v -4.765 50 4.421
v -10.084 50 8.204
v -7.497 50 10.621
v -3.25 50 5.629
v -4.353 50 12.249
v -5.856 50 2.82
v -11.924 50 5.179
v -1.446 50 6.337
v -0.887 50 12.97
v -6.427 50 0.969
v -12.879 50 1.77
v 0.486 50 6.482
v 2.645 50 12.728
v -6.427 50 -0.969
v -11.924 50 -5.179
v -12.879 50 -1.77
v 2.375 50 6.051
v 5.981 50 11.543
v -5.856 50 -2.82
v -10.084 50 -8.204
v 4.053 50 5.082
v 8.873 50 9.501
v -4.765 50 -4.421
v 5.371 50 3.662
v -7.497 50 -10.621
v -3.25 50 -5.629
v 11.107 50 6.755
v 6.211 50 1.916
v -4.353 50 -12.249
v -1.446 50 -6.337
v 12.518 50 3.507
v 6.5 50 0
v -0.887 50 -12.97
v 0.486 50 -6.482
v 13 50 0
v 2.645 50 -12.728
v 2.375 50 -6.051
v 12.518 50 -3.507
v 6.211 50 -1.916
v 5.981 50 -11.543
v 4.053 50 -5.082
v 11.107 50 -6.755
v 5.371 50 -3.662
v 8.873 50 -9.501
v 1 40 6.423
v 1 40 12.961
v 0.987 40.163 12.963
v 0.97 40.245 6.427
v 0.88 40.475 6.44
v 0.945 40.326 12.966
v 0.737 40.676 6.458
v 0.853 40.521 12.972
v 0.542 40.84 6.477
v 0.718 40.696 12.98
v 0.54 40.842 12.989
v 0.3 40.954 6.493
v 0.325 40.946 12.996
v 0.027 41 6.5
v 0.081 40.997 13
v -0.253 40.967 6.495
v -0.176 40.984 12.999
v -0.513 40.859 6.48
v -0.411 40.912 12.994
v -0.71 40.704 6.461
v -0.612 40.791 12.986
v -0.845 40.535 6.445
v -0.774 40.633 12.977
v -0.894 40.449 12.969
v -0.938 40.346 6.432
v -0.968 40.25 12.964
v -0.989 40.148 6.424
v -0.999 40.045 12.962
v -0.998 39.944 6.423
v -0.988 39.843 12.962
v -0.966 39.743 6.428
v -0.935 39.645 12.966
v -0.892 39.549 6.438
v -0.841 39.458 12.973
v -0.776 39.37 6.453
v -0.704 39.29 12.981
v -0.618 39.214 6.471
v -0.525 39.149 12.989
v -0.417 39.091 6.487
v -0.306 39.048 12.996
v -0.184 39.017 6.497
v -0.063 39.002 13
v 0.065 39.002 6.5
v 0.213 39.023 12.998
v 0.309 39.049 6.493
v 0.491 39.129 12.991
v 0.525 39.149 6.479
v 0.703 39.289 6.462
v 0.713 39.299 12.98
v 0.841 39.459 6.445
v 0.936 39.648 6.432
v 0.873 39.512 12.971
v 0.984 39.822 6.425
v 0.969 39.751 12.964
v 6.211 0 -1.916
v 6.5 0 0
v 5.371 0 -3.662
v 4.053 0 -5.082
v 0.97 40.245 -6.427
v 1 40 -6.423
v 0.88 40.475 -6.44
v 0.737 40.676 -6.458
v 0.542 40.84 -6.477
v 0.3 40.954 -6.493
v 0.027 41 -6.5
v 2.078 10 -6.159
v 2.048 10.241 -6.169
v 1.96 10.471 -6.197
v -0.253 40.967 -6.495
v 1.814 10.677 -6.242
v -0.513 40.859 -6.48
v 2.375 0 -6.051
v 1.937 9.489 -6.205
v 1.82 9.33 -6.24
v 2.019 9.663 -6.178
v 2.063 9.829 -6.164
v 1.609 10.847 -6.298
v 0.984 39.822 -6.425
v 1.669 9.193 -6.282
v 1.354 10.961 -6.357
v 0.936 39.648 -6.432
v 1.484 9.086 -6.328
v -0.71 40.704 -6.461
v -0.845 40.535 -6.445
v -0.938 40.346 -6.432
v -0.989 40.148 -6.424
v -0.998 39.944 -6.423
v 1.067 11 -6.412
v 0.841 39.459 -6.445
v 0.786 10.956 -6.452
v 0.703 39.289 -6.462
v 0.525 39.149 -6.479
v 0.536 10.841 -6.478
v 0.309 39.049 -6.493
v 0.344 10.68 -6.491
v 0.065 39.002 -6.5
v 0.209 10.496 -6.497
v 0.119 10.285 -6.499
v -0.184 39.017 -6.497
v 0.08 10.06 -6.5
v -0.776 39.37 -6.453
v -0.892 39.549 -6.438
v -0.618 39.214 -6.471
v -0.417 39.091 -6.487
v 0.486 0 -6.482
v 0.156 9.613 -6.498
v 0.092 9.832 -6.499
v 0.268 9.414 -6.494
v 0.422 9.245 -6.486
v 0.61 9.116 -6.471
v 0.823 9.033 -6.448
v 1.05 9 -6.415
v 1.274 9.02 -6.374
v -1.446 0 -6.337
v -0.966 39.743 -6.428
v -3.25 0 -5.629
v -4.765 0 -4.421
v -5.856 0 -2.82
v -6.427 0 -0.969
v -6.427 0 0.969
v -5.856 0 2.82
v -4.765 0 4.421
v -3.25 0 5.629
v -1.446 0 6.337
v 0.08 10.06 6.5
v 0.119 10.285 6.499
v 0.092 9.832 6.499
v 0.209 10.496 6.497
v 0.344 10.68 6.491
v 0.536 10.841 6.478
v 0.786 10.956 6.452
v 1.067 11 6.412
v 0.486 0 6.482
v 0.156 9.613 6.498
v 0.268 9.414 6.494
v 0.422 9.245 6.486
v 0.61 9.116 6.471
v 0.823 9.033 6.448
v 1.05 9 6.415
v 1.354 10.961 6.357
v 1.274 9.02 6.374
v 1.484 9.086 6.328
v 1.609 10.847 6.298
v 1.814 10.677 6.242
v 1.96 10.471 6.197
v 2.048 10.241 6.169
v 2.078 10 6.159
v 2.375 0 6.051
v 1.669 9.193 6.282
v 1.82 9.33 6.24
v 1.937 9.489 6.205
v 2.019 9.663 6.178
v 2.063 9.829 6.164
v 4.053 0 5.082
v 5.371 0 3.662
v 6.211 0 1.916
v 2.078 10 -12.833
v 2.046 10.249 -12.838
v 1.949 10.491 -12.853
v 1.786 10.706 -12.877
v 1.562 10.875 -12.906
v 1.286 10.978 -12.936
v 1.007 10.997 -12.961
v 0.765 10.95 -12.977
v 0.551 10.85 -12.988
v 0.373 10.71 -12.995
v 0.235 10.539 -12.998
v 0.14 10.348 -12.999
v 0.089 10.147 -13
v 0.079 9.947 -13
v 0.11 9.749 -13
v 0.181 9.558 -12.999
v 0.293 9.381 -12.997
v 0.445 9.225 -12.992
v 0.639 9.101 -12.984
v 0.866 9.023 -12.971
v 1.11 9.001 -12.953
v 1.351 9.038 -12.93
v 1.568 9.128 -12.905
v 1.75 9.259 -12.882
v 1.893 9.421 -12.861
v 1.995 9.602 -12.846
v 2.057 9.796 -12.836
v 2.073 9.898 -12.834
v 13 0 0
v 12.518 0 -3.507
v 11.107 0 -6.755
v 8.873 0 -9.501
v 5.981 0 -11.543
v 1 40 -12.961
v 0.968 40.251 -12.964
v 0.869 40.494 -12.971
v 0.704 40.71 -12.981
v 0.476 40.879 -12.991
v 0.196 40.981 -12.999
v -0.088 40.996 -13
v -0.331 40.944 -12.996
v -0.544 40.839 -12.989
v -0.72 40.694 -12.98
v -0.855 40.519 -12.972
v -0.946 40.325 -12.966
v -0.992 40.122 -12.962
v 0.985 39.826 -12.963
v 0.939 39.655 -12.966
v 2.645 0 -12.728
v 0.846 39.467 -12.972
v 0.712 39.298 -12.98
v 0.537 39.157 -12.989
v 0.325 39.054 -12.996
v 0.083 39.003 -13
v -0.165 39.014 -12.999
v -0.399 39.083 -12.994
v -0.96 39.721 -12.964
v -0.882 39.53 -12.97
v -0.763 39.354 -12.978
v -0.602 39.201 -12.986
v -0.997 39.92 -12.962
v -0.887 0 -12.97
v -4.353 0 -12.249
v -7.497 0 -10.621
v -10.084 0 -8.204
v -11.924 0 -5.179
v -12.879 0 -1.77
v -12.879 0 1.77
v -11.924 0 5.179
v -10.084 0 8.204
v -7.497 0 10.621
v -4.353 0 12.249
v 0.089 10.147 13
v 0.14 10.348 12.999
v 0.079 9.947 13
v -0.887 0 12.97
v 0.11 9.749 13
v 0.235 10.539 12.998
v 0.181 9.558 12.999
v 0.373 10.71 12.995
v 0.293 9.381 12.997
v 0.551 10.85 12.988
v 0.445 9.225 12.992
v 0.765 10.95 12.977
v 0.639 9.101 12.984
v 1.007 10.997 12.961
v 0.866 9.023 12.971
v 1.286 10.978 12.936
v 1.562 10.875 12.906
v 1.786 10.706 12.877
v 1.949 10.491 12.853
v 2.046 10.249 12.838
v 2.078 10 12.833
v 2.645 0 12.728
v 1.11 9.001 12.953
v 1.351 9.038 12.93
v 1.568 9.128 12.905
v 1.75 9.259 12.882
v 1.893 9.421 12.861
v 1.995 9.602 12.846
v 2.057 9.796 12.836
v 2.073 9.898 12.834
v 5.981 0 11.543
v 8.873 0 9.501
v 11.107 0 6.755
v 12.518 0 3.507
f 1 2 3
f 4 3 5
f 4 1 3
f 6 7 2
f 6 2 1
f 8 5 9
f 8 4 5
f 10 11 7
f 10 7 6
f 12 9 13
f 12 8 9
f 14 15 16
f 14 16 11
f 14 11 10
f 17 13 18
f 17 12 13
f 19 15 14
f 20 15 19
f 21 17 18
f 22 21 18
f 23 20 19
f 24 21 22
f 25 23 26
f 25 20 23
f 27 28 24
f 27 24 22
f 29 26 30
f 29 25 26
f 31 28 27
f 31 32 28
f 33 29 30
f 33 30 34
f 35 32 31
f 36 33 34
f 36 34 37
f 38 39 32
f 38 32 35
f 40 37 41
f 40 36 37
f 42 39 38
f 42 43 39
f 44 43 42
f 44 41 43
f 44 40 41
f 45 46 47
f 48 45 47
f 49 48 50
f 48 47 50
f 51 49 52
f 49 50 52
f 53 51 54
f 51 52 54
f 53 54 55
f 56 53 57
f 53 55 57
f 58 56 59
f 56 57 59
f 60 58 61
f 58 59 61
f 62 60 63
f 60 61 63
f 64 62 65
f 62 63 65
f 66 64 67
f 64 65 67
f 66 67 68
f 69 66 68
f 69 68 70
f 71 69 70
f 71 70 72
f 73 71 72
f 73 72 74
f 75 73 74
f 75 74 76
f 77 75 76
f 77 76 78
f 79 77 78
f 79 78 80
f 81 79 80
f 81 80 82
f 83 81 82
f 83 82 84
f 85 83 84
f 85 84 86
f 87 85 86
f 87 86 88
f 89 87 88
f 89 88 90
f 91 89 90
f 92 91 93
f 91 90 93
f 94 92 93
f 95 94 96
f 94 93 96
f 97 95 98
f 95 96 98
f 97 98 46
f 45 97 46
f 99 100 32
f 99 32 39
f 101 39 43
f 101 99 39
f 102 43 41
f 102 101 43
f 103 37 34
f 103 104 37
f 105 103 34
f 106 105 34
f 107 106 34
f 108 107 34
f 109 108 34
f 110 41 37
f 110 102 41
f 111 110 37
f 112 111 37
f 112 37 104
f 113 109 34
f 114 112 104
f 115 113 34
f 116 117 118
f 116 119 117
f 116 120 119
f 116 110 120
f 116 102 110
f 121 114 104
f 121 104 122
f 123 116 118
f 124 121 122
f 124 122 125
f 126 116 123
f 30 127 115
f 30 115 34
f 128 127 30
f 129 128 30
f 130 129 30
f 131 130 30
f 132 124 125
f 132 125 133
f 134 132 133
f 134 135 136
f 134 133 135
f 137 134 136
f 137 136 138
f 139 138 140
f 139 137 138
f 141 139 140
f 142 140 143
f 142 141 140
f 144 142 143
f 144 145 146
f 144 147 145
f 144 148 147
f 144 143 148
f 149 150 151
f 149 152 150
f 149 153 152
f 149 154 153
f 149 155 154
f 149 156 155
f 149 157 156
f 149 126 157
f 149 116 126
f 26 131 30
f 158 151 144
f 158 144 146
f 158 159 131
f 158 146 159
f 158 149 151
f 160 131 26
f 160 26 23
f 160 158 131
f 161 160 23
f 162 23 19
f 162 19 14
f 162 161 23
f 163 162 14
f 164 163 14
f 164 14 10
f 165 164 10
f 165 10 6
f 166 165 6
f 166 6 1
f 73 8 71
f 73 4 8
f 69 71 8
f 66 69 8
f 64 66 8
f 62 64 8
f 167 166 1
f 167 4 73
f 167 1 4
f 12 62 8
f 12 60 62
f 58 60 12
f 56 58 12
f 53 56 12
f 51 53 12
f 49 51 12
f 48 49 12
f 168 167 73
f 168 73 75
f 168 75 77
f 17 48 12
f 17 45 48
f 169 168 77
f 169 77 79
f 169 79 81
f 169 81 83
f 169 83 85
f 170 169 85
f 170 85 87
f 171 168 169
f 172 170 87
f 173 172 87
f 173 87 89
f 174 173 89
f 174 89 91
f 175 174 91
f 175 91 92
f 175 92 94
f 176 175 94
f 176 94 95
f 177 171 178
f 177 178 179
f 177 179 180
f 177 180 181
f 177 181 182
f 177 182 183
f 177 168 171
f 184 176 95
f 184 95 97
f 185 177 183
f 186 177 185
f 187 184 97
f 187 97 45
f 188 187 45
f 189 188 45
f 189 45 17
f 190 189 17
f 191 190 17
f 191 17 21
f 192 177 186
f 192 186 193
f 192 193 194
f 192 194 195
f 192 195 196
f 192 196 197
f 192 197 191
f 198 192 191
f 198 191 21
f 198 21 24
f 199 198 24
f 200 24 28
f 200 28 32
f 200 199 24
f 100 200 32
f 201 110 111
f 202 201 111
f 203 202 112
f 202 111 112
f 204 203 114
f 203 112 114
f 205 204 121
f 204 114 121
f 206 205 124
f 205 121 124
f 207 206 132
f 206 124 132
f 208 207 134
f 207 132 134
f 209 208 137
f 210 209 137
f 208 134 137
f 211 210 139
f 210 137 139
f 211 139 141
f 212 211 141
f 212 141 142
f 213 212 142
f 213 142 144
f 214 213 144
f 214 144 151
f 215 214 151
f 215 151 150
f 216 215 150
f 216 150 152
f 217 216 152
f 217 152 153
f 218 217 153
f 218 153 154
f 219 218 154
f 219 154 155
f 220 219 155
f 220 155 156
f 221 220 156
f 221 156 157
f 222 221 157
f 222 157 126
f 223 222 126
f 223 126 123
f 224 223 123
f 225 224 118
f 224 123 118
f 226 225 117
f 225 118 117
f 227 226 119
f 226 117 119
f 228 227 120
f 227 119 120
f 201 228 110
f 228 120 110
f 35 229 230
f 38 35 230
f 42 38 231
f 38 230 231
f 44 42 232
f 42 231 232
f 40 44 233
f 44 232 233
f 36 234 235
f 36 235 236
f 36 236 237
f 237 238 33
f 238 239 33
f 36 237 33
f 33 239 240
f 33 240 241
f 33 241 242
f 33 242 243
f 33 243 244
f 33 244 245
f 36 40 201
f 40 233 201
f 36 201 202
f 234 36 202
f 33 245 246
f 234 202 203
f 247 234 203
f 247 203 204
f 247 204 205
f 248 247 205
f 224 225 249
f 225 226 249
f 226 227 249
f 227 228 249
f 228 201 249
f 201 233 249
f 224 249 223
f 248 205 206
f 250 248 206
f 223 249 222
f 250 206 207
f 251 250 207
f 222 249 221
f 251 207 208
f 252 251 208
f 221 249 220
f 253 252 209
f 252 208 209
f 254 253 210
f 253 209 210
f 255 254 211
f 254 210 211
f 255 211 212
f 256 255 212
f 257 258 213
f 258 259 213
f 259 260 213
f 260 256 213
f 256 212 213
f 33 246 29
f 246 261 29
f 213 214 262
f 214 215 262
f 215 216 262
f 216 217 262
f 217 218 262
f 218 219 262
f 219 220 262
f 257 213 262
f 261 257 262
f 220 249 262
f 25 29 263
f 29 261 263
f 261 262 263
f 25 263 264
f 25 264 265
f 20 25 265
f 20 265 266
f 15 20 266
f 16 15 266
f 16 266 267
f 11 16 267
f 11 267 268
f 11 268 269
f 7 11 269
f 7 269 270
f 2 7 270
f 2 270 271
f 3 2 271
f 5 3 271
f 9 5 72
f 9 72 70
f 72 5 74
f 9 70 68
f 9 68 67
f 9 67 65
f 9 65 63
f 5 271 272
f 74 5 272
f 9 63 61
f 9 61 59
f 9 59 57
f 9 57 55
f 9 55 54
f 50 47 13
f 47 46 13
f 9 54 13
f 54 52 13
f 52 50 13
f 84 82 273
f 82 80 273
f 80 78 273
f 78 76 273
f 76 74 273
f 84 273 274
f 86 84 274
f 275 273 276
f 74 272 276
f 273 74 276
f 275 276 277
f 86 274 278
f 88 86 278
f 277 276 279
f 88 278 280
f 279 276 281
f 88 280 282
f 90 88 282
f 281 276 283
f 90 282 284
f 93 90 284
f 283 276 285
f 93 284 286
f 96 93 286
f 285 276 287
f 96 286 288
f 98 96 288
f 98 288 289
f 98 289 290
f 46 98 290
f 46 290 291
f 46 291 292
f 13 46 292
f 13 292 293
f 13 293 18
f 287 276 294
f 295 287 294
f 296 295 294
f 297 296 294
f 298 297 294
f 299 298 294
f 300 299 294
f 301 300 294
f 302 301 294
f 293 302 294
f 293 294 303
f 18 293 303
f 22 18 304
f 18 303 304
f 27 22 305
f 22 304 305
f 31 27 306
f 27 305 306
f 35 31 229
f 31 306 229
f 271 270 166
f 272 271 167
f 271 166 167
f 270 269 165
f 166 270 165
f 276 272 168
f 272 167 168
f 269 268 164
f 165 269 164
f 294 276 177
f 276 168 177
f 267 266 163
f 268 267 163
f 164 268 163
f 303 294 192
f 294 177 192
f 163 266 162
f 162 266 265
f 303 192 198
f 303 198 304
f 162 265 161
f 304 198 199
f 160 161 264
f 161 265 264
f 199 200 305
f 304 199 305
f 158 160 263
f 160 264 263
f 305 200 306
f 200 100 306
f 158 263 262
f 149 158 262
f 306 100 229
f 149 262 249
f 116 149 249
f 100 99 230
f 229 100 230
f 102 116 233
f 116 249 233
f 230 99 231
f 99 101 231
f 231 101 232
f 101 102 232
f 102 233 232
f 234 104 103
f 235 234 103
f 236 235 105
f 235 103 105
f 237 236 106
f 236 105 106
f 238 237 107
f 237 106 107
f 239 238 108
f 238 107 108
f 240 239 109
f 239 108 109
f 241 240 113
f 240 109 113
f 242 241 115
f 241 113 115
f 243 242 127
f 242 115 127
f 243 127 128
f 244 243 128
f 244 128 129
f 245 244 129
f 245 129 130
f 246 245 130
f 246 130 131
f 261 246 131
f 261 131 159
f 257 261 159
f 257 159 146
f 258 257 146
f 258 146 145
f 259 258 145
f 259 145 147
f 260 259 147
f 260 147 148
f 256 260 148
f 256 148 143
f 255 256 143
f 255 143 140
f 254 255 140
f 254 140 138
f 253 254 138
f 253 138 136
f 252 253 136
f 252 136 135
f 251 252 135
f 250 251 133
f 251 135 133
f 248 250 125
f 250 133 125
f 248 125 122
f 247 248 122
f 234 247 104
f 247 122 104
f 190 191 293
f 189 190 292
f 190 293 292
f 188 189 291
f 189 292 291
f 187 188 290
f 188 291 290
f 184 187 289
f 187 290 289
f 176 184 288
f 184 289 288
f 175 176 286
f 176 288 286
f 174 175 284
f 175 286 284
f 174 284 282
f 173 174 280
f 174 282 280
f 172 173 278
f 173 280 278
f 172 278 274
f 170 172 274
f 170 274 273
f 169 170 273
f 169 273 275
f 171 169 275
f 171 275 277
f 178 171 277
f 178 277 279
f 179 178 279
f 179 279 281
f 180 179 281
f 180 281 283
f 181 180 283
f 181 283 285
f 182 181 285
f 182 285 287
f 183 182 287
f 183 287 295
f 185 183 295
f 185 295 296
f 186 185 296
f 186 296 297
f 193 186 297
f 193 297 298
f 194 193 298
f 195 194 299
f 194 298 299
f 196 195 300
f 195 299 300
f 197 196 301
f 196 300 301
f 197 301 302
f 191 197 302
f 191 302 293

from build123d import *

# Parameters (mm, degrees)
SKETCH1_R           = 13
SKETCH1_R_2         = 6.5
BOSS_EXTRUDE1_DEPTH = 50
SKETCH3_R           = 1
CUT_EXTRUDE1_DEPTH  = 73


with BuildPart() as part:
    # Sketch1 → Boss-Extrude1 (new body)
    with BuildSketch(Plane(origin=(0, 0, 0), x_dir=(1, 0, 0), z_dir=(0, 1, 0))):
        Circle(SKETCH1_R)
        Circle(SKETCH1_R_2, mode=Mode.SUBTRACT)
    extrude(amount=BOSS_EXTRUDE1_DEPTH)

    # Sketch3 → Cut-Extrude1 (cut)
    with BuildSketch(Plane(origin=(0, 50, 13), x_dir=(1, 0, 0), z_dir=(0, 0, 1))):
        with Locations((0, -10)):
            Circle(SKETCH3_R)
        with Locations((1.077748206, -40)):
            Circle(SKETCH3_R)
    extrude(amount=-CUT_EXTRUDE1_DEPTH, mode=Mode.SUBTRACT)


solid = part.part
